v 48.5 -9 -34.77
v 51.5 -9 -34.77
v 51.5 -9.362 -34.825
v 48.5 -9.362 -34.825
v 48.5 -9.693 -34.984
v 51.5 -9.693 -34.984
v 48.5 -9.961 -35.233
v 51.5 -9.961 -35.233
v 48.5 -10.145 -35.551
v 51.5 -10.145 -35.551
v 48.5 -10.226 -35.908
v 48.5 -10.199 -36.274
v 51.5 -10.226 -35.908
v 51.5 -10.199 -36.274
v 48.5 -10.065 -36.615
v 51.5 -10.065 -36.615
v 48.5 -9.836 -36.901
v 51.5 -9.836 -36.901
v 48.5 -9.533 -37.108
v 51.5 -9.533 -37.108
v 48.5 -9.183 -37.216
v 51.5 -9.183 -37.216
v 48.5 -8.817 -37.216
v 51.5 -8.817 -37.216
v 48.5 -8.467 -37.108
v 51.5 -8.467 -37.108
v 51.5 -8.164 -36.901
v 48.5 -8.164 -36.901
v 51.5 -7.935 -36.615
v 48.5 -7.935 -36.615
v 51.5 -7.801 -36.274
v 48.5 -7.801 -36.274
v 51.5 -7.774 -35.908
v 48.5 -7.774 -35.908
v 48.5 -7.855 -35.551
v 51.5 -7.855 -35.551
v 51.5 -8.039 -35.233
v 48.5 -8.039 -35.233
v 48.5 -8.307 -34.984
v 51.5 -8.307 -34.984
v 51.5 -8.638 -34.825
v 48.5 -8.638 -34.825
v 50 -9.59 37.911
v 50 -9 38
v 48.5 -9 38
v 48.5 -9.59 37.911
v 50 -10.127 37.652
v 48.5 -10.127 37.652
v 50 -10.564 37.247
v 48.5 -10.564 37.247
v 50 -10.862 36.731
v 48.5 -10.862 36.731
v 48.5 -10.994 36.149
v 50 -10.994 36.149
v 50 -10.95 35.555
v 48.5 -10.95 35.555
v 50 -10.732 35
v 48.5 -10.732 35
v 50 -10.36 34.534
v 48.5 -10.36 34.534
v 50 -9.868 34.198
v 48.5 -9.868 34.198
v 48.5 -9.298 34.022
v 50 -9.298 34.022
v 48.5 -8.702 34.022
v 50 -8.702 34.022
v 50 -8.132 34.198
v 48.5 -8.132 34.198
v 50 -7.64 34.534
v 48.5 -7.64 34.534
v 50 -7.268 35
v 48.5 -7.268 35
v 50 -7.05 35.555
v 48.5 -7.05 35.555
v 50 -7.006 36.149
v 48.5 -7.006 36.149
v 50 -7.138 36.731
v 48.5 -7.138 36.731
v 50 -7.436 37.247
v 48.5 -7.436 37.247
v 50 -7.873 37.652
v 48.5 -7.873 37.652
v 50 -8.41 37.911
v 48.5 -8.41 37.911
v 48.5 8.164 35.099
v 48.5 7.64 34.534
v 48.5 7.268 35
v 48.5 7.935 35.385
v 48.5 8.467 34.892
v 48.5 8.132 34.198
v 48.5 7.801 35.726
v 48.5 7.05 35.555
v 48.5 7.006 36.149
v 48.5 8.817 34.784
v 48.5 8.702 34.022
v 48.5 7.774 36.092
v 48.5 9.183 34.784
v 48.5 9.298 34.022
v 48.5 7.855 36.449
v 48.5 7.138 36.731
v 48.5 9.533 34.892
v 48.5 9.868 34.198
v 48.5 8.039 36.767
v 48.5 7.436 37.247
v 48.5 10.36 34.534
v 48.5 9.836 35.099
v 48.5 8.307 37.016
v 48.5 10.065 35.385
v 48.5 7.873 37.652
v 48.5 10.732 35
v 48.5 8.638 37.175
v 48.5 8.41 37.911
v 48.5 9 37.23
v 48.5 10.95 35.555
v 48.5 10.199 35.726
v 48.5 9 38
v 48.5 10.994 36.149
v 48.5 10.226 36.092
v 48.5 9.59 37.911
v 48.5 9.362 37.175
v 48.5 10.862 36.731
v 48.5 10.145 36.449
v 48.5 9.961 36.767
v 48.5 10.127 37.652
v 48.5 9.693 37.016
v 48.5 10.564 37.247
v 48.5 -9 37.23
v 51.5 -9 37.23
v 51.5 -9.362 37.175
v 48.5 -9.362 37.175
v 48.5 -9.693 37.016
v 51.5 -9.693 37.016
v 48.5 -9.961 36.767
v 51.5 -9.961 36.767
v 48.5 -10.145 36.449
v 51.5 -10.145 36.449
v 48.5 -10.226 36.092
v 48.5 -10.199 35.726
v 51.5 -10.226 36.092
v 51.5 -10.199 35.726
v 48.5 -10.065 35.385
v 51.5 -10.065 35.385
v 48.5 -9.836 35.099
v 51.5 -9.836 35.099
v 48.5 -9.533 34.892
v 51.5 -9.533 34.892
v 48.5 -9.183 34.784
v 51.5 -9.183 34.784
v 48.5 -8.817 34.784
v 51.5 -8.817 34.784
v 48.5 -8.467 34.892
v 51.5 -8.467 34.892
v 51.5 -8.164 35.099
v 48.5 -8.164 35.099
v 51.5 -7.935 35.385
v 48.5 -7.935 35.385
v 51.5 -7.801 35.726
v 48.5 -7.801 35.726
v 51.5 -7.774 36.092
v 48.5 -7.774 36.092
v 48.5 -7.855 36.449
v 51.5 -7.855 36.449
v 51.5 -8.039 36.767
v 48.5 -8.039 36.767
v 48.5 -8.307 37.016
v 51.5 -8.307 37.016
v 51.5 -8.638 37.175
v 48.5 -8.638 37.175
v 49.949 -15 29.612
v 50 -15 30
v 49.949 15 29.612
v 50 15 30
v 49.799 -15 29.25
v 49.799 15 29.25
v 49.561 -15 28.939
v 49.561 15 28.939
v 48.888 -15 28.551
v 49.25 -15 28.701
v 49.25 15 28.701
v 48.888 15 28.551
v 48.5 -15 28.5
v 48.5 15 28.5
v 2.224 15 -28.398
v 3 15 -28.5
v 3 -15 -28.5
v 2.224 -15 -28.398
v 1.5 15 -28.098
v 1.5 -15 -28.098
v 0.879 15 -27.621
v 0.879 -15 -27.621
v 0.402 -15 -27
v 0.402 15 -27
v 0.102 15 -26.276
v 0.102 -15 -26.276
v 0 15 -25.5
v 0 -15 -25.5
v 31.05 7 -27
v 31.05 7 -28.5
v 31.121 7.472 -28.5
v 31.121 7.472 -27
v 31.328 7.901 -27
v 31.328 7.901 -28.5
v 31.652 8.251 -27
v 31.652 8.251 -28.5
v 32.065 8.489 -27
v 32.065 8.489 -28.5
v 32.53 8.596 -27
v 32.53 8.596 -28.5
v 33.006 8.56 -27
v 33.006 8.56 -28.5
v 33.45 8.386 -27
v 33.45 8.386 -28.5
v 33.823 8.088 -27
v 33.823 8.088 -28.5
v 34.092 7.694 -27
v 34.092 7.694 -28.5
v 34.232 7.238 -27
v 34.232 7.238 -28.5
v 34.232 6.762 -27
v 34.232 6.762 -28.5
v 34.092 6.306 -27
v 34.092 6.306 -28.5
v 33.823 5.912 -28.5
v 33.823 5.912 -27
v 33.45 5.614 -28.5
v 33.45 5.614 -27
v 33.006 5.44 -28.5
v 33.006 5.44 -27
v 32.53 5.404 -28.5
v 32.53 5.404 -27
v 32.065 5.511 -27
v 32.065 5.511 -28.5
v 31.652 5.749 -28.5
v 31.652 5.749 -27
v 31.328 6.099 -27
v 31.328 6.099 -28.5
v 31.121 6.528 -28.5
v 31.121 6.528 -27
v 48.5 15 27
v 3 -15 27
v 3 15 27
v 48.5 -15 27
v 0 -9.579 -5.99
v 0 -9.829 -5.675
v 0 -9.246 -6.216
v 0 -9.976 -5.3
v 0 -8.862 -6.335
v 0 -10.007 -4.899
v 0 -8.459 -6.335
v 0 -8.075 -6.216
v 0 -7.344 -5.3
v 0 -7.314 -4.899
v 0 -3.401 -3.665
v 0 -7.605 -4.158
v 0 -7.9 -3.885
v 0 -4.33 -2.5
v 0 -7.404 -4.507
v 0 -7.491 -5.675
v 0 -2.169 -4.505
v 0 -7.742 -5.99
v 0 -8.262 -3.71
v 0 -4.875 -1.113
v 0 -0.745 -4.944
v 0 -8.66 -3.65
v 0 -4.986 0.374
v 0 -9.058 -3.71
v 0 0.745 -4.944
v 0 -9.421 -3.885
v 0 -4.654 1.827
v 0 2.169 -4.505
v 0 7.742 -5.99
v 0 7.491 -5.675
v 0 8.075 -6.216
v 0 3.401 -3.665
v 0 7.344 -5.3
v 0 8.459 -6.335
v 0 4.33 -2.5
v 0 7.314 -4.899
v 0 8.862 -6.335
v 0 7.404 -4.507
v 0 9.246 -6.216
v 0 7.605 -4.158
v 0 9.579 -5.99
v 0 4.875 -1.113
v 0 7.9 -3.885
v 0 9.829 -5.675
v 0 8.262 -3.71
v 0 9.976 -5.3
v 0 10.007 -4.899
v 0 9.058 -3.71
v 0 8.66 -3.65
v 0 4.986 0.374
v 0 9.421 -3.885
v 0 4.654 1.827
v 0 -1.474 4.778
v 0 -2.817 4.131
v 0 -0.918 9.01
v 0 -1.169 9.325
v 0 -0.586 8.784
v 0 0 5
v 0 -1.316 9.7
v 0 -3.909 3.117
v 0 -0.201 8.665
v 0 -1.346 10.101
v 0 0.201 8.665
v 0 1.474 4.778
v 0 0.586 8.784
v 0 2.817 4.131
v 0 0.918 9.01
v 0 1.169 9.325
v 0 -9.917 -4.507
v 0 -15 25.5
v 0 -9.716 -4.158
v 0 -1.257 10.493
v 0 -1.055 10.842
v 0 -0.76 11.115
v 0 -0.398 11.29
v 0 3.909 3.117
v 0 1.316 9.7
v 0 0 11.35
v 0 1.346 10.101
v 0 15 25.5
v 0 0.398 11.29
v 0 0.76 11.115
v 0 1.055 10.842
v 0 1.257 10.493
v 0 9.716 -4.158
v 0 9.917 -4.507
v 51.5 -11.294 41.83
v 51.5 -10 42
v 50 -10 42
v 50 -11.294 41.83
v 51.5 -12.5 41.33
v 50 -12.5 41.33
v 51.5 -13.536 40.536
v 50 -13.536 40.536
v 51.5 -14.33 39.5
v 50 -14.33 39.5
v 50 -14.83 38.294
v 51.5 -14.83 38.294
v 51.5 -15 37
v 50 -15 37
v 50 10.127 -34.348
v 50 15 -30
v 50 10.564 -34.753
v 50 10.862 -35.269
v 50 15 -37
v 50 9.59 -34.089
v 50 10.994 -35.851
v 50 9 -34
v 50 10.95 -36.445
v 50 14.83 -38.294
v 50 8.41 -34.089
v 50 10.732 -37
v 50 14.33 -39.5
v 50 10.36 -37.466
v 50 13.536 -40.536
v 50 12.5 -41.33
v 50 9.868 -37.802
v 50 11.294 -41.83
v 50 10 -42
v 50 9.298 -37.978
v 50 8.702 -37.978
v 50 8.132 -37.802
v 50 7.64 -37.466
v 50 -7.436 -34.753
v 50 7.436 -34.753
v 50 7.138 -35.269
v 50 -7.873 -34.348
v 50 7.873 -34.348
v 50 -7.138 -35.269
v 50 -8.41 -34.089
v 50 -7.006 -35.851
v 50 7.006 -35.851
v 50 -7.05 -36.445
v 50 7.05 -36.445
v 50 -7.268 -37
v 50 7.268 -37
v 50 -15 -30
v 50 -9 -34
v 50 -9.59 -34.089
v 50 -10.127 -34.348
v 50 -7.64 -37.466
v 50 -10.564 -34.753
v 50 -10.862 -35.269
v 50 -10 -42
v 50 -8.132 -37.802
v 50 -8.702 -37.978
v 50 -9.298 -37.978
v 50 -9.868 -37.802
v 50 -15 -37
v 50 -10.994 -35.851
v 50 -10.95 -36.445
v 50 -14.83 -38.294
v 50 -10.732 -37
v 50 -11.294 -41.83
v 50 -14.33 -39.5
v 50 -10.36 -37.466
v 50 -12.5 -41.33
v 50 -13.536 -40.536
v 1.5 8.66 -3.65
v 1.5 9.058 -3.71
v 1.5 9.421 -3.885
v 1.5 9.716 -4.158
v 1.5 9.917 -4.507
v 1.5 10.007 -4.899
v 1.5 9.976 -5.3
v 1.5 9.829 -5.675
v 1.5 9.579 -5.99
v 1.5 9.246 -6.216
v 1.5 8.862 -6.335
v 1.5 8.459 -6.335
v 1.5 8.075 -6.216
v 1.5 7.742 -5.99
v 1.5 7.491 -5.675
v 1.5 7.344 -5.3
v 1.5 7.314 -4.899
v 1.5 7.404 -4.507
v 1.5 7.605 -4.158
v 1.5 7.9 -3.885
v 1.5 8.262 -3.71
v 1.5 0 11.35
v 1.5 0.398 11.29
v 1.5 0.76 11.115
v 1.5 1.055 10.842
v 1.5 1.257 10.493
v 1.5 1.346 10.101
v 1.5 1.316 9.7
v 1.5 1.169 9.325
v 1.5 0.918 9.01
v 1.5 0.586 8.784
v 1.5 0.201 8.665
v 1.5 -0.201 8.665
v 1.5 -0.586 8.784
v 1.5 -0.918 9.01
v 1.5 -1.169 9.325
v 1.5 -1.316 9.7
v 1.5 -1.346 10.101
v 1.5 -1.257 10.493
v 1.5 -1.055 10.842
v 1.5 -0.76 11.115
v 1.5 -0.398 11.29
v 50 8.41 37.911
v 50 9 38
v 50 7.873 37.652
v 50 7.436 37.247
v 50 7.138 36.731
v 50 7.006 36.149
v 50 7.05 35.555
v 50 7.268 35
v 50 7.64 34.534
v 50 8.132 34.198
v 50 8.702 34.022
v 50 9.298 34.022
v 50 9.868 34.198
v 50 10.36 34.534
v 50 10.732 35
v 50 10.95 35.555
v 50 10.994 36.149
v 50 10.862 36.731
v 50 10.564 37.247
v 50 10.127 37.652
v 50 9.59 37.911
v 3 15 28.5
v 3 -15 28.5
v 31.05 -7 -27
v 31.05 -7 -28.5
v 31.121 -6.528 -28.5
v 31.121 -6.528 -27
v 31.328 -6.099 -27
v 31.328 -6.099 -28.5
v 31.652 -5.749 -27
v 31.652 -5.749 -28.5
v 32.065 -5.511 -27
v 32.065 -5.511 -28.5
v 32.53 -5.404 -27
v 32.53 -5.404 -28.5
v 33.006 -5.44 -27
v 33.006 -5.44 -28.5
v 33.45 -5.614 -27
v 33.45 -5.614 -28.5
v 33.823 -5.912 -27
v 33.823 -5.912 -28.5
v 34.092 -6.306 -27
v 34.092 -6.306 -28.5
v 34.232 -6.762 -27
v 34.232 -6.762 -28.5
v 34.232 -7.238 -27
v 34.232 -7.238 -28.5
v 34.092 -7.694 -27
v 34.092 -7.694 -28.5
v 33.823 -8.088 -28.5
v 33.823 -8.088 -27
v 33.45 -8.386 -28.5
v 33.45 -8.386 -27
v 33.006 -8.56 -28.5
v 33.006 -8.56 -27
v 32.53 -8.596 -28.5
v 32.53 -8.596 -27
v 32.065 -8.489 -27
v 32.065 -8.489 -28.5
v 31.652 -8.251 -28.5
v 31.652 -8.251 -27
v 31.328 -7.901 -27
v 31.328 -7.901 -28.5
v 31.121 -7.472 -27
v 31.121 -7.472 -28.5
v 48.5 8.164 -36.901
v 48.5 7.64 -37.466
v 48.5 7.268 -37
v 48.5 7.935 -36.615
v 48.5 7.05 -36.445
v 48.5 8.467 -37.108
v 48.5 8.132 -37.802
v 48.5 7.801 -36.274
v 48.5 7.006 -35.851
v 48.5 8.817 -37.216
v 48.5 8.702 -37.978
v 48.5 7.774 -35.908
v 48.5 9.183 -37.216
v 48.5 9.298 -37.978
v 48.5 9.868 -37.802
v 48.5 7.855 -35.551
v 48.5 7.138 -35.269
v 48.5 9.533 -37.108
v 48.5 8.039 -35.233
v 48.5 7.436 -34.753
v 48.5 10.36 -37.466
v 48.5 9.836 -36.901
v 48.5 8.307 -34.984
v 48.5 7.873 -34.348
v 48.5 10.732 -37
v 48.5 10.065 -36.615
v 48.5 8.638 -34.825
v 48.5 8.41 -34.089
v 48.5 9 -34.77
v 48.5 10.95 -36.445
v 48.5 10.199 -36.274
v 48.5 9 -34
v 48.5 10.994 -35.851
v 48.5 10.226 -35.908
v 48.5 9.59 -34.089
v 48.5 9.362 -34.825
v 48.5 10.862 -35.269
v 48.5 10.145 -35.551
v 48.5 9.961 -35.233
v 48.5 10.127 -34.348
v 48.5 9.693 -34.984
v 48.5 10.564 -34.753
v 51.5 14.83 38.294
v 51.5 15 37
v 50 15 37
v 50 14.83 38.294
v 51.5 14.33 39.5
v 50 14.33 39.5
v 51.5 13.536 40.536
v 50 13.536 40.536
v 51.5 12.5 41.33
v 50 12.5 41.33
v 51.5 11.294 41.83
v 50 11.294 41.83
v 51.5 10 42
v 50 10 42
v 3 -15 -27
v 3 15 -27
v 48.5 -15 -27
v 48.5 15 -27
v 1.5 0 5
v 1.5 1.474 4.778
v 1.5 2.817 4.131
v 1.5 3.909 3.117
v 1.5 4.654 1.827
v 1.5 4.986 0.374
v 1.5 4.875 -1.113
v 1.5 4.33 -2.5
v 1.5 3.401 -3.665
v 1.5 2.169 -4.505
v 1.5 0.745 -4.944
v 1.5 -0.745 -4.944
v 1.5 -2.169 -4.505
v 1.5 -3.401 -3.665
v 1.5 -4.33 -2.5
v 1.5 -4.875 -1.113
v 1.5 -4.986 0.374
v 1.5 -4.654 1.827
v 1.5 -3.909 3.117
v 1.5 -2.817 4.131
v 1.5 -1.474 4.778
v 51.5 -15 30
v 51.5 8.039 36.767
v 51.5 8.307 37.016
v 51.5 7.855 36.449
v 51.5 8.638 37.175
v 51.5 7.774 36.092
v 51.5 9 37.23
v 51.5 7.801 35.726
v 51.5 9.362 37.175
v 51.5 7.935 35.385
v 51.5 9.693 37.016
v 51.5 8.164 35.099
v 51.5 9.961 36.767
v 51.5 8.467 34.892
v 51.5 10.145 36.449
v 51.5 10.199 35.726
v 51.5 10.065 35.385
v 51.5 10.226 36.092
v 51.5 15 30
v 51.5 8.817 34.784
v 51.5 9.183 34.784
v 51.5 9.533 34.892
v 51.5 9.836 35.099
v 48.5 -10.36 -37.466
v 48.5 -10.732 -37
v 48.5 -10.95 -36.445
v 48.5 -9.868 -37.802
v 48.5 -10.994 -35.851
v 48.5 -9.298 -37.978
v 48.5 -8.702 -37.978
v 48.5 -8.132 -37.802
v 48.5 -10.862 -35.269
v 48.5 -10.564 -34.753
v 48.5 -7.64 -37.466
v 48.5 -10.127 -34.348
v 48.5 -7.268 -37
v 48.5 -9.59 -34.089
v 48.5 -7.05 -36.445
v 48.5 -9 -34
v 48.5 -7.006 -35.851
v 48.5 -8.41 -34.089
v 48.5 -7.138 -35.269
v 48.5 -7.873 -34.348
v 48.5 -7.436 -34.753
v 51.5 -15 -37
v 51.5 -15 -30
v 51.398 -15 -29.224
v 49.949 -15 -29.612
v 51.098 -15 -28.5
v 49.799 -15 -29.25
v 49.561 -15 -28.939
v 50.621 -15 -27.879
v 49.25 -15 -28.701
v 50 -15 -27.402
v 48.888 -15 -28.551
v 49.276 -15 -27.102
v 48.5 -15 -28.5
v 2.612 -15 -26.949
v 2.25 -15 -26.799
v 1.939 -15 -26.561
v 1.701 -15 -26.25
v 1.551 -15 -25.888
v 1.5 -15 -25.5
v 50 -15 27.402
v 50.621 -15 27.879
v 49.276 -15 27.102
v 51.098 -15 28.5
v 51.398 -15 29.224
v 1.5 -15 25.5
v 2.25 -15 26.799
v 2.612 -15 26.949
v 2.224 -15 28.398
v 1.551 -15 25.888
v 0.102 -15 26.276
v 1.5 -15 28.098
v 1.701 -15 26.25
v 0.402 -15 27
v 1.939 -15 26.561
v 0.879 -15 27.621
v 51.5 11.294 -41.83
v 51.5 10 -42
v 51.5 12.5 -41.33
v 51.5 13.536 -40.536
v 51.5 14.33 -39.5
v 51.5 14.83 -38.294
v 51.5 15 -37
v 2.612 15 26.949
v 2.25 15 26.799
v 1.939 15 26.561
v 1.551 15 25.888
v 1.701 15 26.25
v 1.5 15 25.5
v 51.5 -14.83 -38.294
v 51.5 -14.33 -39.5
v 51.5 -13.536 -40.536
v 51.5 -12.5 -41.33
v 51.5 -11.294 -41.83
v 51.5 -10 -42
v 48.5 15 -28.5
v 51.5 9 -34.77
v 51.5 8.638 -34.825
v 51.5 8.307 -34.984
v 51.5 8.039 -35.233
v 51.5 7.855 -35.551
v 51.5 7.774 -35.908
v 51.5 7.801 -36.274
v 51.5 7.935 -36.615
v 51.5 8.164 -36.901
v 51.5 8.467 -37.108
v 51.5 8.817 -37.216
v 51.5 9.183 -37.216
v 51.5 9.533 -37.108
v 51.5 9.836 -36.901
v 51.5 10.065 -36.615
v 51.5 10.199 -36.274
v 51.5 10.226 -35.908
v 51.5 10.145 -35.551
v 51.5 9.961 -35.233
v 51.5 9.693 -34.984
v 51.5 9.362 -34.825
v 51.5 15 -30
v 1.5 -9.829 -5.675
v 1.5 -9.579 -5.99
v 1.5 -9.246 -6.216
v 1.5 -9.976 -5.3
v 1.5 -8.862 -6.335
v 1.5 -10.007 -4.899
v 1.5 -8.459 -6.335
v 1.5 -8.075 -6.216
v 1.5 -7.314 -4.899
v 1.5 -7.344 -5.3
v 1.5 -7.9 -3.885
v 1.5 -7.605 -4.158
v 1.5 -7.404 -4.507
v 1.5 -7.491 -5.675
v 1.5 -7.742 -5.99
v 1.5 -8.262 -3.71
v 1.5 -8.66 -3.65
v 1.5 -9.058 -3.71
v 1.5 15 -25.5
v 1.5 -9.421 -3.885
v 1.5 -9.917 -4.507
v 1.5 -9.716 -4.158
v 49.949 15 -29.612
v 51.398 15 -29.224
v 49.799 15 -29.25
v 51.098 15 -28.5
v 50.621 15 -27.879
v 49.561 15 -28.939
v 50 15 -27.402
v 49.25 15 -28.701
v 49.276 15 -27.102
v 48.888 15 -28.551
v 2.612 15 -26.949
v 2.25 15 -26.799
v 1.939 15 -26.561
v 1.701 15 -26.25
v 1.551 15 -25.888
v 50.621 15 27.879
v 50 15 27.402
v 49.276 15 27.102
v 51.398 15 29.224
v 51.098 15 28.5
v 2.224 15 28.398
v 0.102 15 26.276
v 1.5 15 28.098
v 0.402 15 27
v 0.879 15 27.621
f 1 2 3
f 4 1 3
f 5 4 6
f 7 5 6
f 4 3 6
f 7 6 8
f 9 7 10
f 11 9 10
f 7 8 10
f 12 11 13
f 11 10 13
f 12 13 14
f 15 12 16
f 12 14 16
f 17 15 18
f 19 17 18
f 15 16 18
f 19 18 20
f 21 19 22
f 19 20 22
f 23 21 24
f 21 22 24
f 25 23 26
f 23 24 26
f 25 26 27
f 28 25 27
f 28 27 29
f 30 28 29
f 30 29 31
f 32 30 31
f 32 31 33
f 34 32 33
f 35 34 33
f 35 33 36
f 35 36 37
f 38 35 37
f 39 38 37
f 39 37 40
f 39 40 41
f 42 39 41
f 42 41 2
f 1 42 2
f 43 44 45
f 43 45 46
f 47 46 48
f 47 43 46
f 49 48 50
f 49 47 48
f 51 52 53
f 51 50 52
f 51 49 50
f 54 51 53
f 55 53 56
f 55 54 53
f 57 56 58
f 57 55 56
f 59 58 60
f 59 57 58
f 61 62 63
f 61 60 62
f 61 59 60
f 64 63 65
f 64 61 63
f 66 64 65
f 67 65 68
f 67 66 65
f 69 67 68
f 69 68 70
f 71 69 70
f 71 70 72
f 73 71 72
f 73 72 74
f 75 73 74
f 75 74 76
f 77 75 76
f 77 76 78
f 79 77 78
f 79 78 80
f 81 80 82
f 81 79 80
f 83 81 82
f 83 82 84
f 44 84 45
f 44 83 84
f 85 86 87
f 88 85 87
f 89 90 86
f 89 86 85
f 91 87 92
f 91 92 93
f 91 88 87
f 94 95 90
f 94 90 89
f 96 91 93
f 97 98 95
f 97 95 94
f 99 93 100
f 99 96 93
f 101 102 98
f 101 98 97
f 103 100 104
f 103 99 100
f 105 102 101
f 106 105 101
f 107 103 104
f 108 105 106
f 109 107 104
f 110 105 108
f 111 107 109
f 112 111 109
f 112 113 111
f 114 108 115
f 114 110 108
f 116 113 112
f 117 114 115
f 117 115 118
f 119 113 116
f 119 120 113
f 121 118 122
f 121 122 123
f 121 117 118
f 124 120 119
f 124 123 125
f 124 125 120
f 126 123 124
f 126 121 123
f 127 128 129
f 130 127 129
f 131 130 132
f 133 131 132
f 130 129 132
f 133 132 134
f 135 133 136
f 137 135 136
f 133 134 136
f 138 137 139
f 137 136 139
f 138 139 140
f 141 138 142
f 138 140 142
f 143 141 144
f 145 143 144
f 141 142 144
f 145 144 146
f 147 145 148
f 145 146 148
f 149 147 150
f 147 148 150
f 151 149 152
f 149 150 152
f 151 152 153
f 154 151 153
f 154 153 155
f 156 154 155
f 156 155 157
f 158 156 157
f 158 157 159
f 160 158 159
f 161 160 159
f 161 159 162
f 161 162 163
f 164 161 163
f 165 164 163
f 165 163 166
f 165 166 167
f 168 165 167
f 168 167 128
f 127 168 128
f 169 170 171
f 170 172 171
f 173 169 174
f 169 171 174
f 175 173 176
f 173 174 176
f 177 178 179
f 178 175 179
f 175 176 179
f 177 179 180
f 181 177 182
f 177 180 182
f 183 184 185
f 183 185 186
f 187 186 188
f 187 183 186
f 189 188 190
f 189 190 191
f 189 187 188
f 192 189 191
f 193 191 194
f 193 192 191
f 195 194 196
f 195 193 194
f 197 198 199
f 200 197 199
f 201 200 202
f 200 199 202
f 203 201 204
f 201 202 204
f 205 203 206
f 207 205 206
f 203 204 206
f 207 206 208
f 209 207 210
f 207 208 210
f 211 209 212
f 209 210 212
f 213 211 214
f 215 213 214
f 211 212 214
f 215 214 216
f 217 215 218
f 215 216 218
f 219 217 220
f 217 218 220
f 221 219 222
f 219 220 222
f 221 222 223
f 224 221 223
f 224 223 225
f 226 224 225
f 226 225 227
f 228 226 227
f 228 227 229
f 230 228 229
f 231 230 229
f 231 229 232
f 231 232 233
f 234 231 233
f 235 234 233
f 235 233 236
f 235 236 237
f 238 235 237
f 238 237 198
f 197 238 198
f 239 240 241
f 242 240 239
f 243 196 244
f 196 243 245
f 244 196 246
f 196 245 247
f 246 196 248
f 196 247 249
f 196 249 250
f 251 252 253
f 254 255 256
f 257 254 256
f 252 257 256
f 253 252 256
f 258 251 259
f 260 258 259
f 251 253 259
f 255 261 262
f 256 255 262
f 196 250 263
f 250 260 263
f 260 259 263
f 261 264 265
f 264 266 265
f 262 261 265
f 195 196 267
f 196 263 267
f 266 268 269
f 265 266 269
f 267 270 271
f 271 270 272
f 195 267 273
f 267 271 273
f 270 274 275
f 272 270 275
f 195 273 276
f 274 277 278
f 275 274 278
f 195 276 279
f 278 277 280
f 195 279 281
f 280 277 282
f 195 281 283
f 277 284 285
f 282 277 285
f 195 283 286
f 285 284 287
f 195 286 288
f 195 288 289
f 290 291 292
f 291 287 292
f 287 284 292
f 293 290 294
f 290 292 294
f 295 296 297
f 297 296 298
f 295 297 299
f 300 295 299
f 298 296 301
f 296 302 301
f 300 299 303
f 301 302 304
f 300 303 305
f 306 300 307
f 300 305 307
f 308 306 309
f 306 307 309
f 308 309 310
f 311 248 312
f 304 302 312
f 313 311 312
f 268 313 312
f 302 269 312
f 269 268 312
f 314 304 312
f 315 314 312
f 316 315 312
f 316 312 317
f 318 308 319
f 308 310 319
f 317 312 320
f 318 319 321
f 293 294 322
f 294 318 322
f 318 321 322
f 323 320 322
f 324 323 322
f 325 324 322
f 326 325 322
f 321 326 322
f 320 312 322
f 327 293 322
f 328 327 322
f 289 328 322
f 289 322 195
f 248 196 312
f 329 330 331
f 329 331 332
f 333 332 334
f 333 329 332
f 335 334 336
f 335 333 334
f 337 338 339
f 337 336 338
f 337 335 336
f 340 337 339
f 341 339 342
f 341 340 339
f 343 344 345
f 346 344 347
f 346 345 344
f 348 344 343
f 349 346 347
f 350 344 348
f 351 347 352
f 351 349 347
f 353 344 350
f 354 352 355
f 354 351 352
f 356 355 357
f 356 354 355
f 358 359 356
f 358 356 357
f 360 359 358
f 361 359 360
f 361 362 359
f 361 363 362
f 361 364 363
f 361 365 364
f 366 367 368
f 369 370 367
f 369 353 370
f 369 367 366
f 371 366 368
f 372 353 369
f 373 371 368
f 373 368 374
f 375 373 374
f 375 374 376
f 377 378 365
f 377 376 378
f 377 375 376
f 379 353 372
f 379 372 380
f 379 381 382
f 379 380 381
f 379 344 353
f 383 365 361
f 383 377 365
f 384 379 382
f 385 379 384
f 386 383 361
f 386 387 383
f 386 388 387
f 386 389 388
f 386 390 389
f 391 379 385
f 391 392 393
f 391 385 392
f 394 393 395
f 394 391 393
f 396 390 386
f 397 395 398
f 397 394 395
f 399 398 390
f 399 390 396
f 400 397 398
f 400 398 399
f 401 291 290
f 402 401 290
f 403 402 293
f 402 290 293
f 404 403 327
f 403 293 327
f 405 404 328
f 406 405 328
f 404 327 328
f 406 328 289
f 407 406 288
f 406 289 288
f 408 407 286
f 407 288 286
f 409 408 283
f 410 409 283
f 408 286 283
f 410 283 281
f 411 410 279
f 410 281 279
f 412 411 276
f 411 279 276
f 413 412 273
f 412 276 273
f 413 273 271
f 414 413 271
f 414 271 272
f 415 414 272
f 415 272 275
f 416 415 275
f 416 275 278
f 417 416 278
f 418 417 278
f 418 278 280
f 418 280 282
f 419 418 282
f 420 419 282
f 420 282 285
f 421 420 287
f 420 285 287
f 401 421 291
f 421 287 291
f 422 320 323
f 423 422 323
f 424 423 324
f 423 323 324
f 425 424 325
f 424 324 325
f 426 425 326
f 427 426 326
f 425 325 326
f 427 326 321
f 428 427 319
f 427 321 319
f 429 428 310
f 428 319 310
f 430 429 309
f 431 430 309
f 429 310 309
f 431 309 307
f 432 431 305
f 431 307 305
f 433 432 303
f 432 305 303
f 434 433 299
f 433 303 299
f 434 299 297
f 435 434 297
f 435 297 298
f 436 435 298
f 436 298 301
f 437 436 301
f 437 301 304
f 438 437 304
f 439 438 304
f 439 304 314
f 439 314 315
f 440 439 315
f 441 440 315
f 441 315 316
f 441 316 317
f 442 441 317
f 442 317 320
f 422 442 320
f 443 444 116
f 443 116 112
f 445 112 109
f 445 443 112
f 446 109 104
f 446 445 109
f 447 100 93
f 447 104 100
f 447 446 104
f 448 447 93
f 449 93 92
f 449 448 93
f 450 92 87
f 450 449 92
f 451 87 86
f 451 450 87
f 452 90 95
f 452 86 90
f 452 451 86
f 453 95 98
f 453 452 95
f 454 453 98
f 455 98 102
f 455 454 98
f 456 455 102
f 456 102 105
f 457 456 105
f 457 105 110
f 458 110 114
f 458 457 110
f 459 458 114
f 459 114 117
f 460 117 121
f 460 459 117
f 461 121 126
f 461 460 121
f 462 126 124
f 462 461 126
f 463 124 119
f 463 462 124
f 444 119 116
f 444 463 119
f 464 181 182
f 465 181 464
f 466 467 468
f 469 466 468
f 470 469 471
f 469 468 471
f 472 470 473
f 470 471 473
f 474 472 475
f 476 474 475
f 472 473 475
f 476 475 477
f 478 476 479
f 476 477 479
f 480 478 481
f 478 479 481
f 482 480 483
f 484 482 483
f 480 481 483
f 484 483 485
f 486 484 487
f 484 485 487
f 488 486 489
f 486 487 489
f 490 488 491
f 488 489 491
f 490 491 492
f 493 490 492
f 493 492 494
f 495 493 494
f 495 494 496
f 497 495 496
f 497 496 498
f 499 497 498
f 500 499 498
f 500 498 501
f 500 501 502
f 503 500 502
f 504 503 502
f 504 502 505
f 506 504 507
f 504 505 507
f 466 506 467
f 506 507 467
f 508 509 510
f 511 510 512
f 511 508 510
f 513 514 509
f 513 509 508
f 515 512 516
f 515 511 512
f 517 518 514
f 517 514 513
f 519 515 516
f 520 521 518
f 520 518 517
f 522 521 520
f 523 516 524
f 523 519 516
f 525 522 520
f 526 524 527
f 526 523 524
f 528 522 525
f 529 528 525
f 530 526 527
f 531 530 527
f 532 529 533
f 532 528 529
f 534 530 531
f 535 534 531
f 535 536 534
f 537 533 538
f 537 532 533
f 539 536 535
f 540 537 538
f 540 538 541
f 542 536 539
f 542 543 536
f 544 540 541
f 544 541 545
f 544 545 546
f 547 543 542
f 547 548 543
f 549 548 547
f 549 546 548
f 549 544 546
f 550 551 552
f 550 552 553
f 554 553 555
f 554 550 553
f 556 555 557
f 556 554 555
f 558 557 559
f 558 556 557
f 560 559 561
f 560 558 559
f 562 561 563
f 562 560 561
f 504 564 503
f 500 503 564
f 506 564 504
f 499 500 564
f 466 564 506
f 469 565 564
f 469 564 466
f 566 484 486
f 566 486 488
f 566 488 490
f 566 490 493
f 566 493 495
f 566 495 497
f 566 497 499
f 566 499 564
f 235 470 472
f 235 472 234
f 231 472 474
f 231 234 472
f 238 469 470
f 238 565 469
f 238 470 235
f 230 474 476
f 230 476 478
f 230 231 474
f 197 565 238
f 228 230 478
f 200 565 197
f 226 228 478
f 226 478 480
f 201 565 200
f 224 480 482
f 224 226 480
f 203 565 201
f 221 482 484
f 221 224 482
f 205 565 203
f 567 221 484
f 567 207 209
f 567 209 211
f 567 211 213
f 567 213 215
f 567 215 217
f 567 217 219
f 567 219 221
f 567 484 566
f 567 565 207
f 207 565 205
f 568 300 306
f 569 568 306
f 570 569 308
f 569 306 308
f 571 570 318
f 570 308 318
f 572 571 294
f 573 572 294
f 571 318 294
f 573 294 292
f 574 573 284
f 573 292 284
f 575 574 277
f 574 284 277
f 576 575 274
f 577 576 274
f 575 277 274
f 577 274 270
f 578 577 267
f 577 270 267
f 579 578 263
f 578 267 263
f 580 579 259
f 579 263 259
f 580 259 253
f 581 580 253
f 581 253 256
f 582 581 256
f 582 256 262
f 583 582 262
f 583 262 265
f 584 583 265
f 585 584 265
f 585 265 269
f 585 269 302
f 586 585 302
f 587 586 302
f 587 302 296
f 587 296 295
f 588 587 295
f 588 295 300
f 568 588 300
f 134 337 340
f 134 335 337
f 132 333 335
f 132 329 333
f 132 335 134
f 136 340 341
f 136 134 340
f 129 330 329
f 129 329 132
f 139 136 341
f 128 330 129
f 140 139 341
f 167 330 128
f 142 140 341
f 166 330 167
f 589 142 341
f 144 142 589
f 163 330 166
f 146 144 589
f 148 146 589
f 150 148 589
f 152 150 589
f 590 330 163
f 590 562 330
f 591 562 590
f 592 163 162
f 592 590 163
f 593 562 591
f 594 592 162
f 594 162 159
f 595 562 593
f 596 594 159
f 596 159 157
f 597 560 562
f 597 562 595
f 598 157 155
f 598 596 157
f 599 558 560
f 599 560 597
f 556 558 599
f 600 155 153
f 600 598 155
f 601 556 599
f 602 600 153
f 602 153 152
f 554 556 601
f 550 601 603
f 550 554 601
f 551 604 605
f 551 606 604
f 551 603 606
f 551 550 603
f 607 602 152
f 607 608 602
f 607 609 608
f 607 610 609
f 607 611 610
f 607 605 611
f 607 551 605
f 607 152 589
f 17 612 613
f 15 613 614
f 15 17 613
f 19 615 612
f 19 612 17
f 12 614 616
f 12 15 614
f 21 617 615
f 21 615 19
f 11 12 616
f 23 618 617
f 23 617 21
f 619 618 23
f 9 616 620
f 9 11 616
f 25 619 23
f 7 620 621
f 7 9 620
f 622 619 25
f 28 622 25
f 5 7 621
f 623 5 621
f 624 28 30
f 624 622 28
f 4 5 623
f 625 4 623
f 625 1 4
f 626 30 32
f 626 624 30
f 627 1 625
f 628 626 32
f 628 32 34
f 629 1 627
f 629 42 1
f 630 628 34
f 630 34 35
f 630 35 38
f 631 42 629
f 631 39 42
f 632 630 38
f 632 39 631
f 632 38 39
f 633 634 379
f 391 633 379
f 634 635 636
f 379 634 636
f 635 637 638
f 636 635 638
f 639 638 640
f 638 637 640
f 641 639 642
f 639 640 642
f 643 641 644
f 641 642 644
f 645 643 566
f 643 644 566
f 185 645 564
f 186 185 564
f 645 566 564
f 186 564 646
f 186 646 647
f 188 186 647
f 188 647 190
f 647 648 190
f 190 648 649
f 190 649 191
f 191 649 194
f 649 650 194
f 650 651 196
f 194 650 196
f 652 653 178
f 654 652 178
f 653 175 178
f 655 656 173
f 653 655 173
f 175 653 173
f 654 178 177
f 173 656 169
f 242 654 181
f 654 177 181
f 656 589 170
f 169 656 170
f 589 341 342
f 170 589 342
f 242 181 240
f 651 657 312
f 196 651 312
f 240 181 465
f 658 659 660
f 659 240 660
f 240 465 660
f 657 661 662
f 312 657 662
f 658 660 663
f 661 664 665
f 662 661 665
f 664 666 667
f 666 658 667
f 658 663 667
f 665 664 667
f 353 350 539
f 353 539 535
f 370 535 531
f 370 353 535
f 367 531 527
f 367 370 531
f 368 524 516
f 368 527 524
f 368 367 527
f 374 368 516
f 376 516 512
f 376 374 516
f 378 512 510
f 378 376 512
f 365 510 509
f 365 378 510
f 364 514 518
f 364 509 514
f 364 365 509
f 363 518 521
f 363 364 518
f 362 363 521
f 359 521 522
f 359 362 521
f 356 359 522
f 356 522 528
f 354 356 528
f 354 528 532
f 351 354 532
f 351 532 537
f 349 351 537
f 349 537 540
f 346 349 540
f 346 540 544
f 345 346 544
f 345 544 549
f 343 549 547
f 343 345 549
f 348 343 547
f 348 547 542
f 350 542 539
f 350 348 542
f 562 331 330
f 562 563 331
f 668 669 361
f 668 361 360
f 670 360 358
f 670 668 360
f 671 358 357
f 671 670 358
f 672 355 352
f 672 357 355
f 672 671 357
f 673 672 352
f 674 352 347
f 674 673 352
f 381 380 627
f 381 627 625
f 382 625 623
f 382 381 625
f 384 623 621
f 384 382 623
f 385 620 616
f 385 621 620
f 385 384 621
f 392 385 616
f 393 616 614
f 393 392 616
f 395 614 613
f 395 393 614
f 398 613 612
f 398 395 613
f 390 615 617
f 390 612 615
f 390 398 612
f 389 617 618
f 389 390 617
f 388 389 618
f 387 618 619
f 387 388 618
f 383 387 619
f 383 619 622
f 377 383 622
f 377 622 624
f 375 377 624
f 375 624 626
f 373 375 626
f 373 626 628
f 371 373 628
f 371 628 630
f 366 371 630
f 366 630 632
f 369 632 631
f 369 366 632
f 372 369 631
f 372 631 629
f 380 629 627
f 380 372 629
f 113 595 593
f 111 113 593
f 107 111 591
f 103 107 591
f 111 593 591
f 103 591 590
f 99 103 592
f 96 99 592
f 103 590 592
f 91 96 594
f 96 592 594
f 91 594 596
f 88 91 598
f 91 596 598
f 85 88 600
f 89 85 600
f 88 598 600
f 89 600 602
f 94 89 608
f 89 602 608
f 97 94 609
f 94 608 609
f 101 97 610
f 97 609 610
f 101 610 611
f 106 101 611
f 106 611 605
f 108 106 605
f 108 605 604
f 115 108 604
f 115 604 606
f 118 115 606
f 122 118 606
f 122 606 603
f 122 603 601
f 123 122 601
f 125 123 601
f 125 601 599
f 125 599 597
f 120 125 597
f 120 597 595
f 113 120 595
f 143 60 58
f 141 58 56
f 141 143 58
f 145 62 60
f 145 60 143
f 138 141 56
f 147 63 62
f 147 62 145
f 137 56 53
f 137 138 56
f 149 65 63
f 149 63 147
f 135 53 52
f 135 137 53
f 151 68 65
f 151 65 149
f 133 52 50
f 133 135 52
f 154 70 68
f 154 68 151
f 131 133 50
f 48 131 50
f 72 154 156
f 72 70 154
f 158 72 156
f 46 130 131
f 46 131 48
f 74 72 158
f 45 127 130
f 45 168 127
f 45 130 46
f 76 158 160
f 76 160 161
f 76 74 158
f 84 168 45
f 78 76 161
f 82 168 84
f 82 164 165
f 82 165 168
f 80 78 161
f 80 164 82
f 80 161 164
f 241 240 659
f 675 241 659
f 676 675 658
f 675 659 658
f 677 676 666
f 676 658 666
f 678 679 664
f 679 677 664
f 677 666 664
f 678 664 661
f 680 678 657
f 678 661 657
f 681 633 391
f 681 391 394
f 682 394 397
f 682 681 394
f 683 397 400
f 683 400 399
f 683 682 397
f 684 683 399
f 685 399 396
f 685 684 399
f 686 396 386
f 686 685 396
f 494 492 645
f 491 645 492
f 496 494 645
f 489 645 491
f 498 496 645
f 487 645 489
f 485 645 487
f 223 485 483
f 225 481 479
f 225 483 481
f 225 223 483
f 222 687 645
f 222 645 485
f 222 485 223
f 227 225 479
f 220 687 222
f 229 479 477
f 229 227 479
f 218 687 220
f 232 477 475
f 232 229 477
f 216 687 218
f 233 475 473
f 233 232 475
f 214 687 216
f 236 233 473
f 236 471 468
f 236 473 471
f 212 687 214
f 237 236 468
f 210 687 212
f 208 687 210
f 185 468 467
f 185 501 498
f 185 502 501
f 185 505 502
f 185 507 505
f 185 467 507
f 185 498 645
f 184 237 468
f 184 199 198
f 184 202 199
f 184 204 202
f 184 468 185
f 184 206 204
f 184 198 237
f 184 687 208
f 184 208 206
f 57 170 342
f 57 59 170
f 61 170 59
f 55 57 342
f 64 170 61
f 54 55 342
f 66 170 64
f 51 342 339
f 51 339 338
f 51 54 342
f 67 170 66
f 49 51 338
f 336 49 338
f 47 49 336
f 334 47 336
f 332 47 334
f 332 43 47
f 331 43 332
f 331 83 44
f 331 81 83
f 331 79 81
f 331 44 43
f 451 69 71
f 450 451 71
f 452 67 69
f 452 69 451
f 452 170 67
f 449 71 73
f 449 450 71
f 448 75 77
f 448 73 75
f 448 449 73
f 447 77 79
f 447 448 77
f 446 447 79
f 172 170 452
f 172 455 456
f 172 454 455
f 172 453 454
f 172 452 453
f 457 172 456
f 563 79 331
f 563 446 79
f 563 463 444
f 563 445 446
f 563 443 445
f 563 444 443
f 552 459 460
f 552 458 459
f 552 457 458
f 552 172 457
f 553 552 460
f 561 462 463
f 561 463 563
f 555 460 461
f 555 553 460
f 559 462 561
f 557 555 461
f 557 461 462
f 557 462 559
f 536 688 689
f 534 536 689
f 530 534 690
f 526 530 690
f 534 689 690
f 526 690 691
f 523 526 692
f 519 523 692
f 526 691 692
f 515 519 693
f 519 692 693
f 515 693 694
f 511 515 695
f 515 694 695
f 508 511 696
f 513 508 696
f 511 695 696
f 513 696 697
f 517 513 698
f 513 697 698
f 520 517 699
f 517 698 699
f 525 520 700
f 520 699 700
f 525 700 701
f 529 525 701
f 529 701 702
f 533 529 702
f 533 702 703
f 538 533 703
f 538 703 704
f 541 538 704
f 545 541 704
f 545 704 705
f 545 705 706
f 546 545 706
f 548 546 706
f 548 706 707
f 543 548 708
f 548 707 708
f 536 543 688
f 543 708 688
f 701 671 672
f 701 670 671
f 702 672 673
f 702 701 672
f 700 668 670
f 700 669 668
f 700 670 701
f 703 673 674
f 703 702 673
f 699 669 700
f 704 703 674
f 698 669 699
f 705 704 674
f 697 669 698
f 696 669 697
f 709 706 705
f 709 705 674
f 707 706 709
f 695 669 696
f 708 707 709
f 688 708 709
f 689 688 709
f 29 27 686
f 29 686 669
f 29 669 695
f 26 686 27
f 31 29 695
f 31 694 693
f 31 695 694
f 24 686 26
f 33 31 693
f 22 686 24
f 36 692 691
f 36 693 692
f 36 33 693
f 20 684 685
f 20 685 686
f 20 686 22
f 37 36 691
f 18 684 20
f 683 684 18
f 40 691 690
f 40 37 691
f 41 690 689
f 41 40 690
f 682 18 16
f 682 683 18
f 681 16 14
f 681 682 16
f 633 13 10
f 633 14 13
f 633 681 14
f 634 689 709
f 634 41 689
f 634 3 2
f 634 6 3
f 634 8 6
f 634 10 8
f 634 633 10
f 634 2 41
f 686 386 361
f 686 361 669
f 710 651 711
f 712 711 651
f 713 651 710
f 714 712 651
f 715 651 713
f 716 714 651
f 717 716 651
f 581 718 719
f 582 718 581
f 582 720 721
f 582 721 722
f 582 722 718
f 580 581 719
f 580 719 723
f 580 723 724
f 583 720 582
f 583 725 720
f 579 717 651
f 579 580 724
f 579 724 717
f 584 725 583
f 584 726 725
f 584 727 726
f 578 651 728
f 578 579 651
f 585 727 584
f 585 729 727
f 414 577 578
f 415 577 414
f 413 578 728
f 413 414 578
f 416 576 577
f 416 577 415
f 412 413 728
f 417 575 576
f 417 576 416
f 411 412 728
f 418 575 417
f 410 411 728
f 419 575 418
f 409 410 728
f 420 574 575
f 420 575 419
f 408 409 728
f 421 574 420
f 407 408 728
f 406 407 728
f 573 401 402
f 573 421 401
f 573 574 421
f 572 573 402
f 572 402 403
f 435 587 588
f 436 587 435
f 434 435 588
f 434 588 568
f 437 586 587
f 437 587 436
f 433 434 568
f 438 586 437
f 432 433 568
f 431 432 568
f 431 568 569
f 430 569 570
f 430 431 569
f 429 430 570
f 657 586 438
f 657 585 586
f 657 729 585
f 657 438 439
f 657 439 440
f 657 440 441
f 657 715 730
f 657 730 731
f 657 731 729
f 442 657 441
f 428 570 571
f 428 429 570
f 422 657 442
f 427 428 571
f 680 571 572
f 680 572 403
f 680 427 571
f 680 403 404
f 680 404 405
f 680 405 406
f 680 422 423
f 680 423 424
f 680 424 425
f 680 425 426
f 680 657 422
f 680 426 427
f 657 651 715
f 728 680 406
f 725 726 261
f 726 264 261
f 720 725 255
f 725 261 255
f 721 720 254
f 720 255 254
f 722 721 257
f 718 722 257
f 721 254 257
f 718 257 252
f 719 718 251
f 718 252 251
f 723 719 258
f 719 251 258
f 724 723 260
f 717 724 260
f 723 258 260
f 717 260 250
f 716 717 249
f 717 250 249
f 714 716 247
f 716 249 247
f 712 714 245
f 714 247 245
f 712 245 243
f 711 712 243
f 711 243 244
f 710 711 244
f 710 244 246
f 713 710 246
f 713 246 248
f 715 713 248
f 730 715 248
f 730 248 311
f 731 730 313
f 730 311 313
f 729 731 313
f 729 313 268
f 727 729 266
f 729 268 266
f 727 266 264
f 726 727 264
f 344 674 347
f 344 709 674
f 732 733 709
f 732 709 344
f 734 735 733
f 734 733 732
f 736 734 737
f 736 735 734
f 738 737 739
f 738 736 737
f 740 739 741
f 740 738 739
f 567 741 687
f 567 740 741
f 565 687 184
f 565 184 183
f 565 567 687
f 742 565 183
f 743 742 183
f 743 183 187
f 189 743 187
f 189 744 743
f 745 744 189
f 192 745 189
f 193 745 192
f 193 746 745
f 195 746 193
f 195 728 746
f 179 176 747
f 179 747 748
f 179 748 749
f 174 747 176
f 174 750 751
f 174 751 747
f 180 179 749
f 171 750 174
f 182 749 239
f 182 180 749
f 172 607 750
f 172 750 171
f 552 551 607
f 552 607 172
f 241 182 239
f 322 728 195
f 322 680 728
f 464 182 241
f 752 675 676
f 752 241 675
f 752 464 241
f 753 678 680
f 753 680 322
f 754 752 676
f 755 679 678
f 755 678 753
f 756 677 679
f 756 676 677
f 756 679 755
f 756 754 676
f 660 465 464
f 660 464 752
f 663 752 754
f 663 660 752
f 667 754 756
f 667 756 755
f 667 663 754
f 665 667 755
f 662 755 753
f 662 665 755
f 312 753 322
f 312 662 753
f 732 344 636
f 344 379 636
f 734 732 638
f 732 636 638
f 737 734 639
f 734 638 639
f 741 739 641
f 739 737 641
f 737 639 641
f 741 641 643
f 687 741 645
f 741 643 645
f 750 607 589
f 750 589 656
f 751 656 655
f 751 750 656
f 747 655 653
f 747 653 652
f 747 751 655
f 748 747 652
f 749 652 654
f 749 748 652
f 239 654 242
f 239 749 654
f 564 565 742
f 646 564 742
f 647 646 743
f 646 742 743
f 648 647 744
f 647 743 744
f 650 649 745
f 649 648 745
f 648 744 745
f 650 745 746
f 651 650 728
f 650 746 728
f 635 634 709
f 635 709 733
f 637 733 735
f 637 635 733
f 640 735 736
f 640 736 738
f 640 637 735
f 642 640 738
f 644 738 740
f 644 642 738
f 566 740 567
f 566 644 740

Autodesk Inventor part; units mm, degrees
ref_plane "YZ Plane" through (0, 0, 0) normal (1, 0, 0) x (0, 1, 0)
ref_plane "XZ Plane" through (0, 0, 0) normal (0, 1, 0) x (-1, 0, 0)
ref_plane "XY Plane" through (0, 0, 0) normal (0, 0, 1) x (1, 0, 0)
sketch "スケッチ1" plane through (0, 0, 0) normal (1, 0, 0) x (0, 1, 0)
  line L0 (-15, -27) -> (-15, 27)
  line L1 (-15, 27) -> (15, 27)
  line L2 (15, 27) -> (15, -27)
  line L3 (15, -27) -> (-15, -27)
  line L4 (-15, -27) -> (15, 27) construction
  line L5 (-15, 27) -> (15, -27) construction
  point P0 (0, 0)
  dimension "d0" = 30
  dimension "d1" = 54
extrude "プレート1" add sketch "スケッチ1" along normal blind 1.5
sketch "スケッチ2" plane through (1.5, -15, 27) normal (0, 0, 1) x (1, 0, 0)
  line L0 (0, 30) -> (0, 0)
  line L1 (0, 0) -> (48.5, 0)
  line L2 (48.5, 0) -> (48.5, 30)
  line L3 (48.5, 30) -> (0, 30)
edge flange "フランジ1" height 50 angle 90 thickness 1.5 bend radius 1.5 thickness toward (0, 0, 1) relief tear relief width 1.5 relief depth 0.75 corner gap 1.5 corner form 0 edges at (1.5, 0, 27) (1.5, 0, -27) wall of the first edge with corners at (1.5, 15, 27) (1.5, -15, 27) (50, -15, 27) (50, 15, 27)
bend "曲げ1"
corner "コーナー1"
sketch "スケッチ3" plane through (50, 15, 28.5) normal (1, 0, 0) x (0, 1, 0)
  line L0 (-30, 0) -> (0, 0)
  line L1 (0, 0) -> (0, 13.5)
  line L2 (0, 13.5) -> (-30, 13.5)
  line L3 (-30, 13.5) -> (-30, 0)
edge flange "フランジ2" height 15 angle 90 thickness 1.5 bend radius 1.5 thickness toward (1, 0, 0) relief tear relief width 1.5 relief depth 0.75 corner gap 1.5 corner form 0 edges at (50, 0, 28.5) (50, 0, -28.5) wall of the first edge with corners at (50, -15, 28.5) (50, 15, 28.5) (50, 15, 42) (50, -15, 42)
bend "曲げ2"
corner "コーナー2"
sketch "スケッチ4" plane through (0, 0, 0) normal (-1, 0, 0) x (0, 0, 1)
  circle A0 centre (0, 0) radius 5
  circle A1 centre (10, 0) radius 1.35
  circle A2 centre (-5, 8.6603) radius 1.35
  circle A3 centre (-5, -8.6603) radius 1.35
  dimension "d23" = 10
  dimension "d24" = 2.7
  dimension "d25" = 0
  dimension "d26" = 10
  dimension "d29" = 360
extrude "押し出し1" cut sketch "スケッチ4" against normal blind 2
sketch "スケッチ6" plane through (50, -15, 42) normal (-1, 0, 0) x (0, 0, 1)
  circle A0 centre (-6, 24) radius 2
  line L0 (-12, 30) -> (0, 30) projected
  line L1 (0, 0) -> (0, 30) projected
  circle A1 centre (-6, 6) radius 2
  circle A2 centre (-78, 24) radius 2
  circle A3 centre (-78, 6) radius 2
  point P0 (-42, 15)
  dimension "d41" = 4
  dimension "d42" = 4
  dimension "d43" = 4
  dimension "d46" = 18
  dimension "d49" = 72
extrude "押し出し3" add sketch "スケッチ6" along normal blind 1.5
sketch "スケッチ7" plane through (48.5, 9, 36) normal (-1, 0, 0) x (0, 0, 1)
  circle A0 centre (0, 0) radius 2 projected
  circle A1 centre (0, -18) radius 2 projected
  circle A2 centre (-72, -18) radius 2 projected
  circle A3 centre (-72, 0) radius 2 projected
  circle A4 centre (0, 0) radius 2 projected
  circle A5 centre (0, -18) radius 2 projected
  circle A6 centre (-72, -18) radius 2 projected
  point P0 (-36, -9)
hole "穴1" at (48.5, 9, 36) at (48.5, -9, 36) at (48.5, 9, -36) at (48.5, -9, -36) direction (1, 0, 0) diameter 2.459 depth 3 thread size "M3x0.5" designation "M3" class "6H" standard "GB Metric profile"
fillet "フィレット1" radius 5 4 edges at (50.75, 15, 42) (50.75, -15, 42) (50.75, 15, -42) (50.75, -15, -42)
sketch "スケッチ8" plane through (3, -15, -28.5) normal (0, 0, -1) x (-1, 0, 0)
  circle A0 centre (-29.65, 22) radius 1.6
  line L0 (-47, 25) -> (-47, 5) projected
  line L1 (-45.5, 30) -> (0, 30) projected
  circle A1 centre (-29.65, 8) radius 1.6
  point P0 (3, 15)
  dimension "d62" = 3.2
  dimension "d63" = 17.35
  dimension "d64" = 8
  dimension "d67" = 14
extrude "押し出し4" cut sketch "スケッチ8" against normal blind 10
equation "\"d59\" = Thickness"
equation "\"BendRadius\" = Thickness"
equation "\"BendReliefWidth\" = Thickness"
equation "\"BendReliefDepth\" = 0.5 * Thickness"
equation "\"CornerReliefSize\" = 4 * Thickness"
equation "\"MinimumRemnant\" = 2 * Thickness"
equation "\"TransitionRadius\" = BendRadius"
equation "\"JacobiRadiusSize\" = BendRadius"
equation "\"GapSize\" = Thickness"
properties part number "Old_hand_box2" material "アルミニウム 6061"
